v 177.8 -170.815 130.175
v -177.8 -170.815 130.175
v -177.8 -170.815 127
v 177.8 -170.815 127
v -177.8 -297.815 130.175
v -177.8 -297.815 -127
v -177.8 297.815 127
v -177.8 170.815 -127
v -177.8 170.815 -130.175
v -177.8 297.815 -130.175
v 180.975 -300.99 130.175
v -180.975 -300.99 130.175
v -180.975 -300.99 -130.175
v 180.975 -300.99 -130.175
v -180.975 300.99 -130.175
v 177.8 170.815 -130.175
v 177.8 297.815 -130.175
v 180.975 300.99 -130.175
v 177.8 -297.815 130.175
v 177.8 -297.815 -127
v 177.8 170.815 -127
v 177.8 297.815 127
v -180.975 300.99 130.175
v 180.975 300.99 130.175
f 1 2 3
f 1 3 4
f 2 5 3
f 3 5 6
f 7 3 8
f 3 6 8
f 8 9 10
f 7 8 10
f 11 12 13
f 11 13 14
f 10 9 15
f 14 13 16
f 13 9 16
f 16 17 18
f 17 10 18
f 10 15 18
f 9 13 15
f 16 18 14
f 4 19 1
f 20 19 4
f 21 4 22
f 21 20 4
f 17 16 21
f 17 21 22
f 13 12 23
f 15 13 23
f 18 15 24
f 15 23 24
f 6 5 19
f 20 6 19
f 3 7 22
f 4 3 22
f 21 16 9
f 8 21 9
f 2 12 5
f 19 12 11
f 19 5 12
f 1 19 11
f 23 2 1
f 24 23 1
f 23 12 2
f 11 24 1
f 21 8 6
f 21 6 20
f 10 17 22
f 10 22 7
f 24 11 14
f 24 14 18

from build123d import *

# Parameters (mm, degrees)
ESQUISSE1_W             = 361.95
ESQUISSE1_H             = 601.98
BOSS_EXTRU_1_DEPTH      = 130.175
ESQUISSE3_W             = 355.6
ESQUISSE3_H             = 127
ENL_V_MAT_EXTRU_2_DEPTH = 3.175
ESQUISSE4_W             = 355.6
ESQUISSE4_H             = 595.63
ENL_V_MAT_EXTRU_3_DEPTH = 127
ESQUISSE5_W             = 355.6
ESQUISSE5_H             = 127
ENL_V_MAT_EXTRU_4_DEPTH = 3.175


with BuildPart() as part:
    # Esquisse1 → Boss.-Extru.1 (new, symmetric)
    with BuildSketch(Plane.XY):
        Rectangle(ESQUISSE1_W, ESQUISSE1_H)
    extrude(amount=BOSS_EXTRU_1_DEPTH, both=True)

    # Esquisse3 → Enlèv. mat.-Extru.2 (cut)
    with BuildSketch(Plane.XY.offset(130.175)):
        with Locations((0, -234.315)):
            Rectangle(ESQUISSE3_W, ESQUISSE3_H)
    extrude(amount=-ENL_V_MAT_EXTRU_2_DEPTH, mode=Mode.SUBTRACT)

    # Esquisse4 → Enlèv. mat.-Extru.3 (cut, symmetric)
    with BuildSketch(Plane.XY):
        Rectangle(ESQUISSE4_W, ESQUISSE4_H)
    extrude(amount=ENL_V_MAT_EXTRU_3_DEPTH, both=True, mode=Mode.SUBTRACT)

    # Esquisse5 → Enlèv. mat.-Extru.4 (cut)
    with BuildSketch(Plane(origin=(0, 0, -130.175), x_dir=(-1, 0, 0), z_dir=(0, 0, -1))):
        with Locations((0, 234.315)):
            Rectangle(ESQUISSE5_W, ESQUISSE5_H)
    extrude(amount=-ENL_V_MAT_EXTRU_4_DEPTH, mode=Mode.SUBTRACT)


solid = part.part
